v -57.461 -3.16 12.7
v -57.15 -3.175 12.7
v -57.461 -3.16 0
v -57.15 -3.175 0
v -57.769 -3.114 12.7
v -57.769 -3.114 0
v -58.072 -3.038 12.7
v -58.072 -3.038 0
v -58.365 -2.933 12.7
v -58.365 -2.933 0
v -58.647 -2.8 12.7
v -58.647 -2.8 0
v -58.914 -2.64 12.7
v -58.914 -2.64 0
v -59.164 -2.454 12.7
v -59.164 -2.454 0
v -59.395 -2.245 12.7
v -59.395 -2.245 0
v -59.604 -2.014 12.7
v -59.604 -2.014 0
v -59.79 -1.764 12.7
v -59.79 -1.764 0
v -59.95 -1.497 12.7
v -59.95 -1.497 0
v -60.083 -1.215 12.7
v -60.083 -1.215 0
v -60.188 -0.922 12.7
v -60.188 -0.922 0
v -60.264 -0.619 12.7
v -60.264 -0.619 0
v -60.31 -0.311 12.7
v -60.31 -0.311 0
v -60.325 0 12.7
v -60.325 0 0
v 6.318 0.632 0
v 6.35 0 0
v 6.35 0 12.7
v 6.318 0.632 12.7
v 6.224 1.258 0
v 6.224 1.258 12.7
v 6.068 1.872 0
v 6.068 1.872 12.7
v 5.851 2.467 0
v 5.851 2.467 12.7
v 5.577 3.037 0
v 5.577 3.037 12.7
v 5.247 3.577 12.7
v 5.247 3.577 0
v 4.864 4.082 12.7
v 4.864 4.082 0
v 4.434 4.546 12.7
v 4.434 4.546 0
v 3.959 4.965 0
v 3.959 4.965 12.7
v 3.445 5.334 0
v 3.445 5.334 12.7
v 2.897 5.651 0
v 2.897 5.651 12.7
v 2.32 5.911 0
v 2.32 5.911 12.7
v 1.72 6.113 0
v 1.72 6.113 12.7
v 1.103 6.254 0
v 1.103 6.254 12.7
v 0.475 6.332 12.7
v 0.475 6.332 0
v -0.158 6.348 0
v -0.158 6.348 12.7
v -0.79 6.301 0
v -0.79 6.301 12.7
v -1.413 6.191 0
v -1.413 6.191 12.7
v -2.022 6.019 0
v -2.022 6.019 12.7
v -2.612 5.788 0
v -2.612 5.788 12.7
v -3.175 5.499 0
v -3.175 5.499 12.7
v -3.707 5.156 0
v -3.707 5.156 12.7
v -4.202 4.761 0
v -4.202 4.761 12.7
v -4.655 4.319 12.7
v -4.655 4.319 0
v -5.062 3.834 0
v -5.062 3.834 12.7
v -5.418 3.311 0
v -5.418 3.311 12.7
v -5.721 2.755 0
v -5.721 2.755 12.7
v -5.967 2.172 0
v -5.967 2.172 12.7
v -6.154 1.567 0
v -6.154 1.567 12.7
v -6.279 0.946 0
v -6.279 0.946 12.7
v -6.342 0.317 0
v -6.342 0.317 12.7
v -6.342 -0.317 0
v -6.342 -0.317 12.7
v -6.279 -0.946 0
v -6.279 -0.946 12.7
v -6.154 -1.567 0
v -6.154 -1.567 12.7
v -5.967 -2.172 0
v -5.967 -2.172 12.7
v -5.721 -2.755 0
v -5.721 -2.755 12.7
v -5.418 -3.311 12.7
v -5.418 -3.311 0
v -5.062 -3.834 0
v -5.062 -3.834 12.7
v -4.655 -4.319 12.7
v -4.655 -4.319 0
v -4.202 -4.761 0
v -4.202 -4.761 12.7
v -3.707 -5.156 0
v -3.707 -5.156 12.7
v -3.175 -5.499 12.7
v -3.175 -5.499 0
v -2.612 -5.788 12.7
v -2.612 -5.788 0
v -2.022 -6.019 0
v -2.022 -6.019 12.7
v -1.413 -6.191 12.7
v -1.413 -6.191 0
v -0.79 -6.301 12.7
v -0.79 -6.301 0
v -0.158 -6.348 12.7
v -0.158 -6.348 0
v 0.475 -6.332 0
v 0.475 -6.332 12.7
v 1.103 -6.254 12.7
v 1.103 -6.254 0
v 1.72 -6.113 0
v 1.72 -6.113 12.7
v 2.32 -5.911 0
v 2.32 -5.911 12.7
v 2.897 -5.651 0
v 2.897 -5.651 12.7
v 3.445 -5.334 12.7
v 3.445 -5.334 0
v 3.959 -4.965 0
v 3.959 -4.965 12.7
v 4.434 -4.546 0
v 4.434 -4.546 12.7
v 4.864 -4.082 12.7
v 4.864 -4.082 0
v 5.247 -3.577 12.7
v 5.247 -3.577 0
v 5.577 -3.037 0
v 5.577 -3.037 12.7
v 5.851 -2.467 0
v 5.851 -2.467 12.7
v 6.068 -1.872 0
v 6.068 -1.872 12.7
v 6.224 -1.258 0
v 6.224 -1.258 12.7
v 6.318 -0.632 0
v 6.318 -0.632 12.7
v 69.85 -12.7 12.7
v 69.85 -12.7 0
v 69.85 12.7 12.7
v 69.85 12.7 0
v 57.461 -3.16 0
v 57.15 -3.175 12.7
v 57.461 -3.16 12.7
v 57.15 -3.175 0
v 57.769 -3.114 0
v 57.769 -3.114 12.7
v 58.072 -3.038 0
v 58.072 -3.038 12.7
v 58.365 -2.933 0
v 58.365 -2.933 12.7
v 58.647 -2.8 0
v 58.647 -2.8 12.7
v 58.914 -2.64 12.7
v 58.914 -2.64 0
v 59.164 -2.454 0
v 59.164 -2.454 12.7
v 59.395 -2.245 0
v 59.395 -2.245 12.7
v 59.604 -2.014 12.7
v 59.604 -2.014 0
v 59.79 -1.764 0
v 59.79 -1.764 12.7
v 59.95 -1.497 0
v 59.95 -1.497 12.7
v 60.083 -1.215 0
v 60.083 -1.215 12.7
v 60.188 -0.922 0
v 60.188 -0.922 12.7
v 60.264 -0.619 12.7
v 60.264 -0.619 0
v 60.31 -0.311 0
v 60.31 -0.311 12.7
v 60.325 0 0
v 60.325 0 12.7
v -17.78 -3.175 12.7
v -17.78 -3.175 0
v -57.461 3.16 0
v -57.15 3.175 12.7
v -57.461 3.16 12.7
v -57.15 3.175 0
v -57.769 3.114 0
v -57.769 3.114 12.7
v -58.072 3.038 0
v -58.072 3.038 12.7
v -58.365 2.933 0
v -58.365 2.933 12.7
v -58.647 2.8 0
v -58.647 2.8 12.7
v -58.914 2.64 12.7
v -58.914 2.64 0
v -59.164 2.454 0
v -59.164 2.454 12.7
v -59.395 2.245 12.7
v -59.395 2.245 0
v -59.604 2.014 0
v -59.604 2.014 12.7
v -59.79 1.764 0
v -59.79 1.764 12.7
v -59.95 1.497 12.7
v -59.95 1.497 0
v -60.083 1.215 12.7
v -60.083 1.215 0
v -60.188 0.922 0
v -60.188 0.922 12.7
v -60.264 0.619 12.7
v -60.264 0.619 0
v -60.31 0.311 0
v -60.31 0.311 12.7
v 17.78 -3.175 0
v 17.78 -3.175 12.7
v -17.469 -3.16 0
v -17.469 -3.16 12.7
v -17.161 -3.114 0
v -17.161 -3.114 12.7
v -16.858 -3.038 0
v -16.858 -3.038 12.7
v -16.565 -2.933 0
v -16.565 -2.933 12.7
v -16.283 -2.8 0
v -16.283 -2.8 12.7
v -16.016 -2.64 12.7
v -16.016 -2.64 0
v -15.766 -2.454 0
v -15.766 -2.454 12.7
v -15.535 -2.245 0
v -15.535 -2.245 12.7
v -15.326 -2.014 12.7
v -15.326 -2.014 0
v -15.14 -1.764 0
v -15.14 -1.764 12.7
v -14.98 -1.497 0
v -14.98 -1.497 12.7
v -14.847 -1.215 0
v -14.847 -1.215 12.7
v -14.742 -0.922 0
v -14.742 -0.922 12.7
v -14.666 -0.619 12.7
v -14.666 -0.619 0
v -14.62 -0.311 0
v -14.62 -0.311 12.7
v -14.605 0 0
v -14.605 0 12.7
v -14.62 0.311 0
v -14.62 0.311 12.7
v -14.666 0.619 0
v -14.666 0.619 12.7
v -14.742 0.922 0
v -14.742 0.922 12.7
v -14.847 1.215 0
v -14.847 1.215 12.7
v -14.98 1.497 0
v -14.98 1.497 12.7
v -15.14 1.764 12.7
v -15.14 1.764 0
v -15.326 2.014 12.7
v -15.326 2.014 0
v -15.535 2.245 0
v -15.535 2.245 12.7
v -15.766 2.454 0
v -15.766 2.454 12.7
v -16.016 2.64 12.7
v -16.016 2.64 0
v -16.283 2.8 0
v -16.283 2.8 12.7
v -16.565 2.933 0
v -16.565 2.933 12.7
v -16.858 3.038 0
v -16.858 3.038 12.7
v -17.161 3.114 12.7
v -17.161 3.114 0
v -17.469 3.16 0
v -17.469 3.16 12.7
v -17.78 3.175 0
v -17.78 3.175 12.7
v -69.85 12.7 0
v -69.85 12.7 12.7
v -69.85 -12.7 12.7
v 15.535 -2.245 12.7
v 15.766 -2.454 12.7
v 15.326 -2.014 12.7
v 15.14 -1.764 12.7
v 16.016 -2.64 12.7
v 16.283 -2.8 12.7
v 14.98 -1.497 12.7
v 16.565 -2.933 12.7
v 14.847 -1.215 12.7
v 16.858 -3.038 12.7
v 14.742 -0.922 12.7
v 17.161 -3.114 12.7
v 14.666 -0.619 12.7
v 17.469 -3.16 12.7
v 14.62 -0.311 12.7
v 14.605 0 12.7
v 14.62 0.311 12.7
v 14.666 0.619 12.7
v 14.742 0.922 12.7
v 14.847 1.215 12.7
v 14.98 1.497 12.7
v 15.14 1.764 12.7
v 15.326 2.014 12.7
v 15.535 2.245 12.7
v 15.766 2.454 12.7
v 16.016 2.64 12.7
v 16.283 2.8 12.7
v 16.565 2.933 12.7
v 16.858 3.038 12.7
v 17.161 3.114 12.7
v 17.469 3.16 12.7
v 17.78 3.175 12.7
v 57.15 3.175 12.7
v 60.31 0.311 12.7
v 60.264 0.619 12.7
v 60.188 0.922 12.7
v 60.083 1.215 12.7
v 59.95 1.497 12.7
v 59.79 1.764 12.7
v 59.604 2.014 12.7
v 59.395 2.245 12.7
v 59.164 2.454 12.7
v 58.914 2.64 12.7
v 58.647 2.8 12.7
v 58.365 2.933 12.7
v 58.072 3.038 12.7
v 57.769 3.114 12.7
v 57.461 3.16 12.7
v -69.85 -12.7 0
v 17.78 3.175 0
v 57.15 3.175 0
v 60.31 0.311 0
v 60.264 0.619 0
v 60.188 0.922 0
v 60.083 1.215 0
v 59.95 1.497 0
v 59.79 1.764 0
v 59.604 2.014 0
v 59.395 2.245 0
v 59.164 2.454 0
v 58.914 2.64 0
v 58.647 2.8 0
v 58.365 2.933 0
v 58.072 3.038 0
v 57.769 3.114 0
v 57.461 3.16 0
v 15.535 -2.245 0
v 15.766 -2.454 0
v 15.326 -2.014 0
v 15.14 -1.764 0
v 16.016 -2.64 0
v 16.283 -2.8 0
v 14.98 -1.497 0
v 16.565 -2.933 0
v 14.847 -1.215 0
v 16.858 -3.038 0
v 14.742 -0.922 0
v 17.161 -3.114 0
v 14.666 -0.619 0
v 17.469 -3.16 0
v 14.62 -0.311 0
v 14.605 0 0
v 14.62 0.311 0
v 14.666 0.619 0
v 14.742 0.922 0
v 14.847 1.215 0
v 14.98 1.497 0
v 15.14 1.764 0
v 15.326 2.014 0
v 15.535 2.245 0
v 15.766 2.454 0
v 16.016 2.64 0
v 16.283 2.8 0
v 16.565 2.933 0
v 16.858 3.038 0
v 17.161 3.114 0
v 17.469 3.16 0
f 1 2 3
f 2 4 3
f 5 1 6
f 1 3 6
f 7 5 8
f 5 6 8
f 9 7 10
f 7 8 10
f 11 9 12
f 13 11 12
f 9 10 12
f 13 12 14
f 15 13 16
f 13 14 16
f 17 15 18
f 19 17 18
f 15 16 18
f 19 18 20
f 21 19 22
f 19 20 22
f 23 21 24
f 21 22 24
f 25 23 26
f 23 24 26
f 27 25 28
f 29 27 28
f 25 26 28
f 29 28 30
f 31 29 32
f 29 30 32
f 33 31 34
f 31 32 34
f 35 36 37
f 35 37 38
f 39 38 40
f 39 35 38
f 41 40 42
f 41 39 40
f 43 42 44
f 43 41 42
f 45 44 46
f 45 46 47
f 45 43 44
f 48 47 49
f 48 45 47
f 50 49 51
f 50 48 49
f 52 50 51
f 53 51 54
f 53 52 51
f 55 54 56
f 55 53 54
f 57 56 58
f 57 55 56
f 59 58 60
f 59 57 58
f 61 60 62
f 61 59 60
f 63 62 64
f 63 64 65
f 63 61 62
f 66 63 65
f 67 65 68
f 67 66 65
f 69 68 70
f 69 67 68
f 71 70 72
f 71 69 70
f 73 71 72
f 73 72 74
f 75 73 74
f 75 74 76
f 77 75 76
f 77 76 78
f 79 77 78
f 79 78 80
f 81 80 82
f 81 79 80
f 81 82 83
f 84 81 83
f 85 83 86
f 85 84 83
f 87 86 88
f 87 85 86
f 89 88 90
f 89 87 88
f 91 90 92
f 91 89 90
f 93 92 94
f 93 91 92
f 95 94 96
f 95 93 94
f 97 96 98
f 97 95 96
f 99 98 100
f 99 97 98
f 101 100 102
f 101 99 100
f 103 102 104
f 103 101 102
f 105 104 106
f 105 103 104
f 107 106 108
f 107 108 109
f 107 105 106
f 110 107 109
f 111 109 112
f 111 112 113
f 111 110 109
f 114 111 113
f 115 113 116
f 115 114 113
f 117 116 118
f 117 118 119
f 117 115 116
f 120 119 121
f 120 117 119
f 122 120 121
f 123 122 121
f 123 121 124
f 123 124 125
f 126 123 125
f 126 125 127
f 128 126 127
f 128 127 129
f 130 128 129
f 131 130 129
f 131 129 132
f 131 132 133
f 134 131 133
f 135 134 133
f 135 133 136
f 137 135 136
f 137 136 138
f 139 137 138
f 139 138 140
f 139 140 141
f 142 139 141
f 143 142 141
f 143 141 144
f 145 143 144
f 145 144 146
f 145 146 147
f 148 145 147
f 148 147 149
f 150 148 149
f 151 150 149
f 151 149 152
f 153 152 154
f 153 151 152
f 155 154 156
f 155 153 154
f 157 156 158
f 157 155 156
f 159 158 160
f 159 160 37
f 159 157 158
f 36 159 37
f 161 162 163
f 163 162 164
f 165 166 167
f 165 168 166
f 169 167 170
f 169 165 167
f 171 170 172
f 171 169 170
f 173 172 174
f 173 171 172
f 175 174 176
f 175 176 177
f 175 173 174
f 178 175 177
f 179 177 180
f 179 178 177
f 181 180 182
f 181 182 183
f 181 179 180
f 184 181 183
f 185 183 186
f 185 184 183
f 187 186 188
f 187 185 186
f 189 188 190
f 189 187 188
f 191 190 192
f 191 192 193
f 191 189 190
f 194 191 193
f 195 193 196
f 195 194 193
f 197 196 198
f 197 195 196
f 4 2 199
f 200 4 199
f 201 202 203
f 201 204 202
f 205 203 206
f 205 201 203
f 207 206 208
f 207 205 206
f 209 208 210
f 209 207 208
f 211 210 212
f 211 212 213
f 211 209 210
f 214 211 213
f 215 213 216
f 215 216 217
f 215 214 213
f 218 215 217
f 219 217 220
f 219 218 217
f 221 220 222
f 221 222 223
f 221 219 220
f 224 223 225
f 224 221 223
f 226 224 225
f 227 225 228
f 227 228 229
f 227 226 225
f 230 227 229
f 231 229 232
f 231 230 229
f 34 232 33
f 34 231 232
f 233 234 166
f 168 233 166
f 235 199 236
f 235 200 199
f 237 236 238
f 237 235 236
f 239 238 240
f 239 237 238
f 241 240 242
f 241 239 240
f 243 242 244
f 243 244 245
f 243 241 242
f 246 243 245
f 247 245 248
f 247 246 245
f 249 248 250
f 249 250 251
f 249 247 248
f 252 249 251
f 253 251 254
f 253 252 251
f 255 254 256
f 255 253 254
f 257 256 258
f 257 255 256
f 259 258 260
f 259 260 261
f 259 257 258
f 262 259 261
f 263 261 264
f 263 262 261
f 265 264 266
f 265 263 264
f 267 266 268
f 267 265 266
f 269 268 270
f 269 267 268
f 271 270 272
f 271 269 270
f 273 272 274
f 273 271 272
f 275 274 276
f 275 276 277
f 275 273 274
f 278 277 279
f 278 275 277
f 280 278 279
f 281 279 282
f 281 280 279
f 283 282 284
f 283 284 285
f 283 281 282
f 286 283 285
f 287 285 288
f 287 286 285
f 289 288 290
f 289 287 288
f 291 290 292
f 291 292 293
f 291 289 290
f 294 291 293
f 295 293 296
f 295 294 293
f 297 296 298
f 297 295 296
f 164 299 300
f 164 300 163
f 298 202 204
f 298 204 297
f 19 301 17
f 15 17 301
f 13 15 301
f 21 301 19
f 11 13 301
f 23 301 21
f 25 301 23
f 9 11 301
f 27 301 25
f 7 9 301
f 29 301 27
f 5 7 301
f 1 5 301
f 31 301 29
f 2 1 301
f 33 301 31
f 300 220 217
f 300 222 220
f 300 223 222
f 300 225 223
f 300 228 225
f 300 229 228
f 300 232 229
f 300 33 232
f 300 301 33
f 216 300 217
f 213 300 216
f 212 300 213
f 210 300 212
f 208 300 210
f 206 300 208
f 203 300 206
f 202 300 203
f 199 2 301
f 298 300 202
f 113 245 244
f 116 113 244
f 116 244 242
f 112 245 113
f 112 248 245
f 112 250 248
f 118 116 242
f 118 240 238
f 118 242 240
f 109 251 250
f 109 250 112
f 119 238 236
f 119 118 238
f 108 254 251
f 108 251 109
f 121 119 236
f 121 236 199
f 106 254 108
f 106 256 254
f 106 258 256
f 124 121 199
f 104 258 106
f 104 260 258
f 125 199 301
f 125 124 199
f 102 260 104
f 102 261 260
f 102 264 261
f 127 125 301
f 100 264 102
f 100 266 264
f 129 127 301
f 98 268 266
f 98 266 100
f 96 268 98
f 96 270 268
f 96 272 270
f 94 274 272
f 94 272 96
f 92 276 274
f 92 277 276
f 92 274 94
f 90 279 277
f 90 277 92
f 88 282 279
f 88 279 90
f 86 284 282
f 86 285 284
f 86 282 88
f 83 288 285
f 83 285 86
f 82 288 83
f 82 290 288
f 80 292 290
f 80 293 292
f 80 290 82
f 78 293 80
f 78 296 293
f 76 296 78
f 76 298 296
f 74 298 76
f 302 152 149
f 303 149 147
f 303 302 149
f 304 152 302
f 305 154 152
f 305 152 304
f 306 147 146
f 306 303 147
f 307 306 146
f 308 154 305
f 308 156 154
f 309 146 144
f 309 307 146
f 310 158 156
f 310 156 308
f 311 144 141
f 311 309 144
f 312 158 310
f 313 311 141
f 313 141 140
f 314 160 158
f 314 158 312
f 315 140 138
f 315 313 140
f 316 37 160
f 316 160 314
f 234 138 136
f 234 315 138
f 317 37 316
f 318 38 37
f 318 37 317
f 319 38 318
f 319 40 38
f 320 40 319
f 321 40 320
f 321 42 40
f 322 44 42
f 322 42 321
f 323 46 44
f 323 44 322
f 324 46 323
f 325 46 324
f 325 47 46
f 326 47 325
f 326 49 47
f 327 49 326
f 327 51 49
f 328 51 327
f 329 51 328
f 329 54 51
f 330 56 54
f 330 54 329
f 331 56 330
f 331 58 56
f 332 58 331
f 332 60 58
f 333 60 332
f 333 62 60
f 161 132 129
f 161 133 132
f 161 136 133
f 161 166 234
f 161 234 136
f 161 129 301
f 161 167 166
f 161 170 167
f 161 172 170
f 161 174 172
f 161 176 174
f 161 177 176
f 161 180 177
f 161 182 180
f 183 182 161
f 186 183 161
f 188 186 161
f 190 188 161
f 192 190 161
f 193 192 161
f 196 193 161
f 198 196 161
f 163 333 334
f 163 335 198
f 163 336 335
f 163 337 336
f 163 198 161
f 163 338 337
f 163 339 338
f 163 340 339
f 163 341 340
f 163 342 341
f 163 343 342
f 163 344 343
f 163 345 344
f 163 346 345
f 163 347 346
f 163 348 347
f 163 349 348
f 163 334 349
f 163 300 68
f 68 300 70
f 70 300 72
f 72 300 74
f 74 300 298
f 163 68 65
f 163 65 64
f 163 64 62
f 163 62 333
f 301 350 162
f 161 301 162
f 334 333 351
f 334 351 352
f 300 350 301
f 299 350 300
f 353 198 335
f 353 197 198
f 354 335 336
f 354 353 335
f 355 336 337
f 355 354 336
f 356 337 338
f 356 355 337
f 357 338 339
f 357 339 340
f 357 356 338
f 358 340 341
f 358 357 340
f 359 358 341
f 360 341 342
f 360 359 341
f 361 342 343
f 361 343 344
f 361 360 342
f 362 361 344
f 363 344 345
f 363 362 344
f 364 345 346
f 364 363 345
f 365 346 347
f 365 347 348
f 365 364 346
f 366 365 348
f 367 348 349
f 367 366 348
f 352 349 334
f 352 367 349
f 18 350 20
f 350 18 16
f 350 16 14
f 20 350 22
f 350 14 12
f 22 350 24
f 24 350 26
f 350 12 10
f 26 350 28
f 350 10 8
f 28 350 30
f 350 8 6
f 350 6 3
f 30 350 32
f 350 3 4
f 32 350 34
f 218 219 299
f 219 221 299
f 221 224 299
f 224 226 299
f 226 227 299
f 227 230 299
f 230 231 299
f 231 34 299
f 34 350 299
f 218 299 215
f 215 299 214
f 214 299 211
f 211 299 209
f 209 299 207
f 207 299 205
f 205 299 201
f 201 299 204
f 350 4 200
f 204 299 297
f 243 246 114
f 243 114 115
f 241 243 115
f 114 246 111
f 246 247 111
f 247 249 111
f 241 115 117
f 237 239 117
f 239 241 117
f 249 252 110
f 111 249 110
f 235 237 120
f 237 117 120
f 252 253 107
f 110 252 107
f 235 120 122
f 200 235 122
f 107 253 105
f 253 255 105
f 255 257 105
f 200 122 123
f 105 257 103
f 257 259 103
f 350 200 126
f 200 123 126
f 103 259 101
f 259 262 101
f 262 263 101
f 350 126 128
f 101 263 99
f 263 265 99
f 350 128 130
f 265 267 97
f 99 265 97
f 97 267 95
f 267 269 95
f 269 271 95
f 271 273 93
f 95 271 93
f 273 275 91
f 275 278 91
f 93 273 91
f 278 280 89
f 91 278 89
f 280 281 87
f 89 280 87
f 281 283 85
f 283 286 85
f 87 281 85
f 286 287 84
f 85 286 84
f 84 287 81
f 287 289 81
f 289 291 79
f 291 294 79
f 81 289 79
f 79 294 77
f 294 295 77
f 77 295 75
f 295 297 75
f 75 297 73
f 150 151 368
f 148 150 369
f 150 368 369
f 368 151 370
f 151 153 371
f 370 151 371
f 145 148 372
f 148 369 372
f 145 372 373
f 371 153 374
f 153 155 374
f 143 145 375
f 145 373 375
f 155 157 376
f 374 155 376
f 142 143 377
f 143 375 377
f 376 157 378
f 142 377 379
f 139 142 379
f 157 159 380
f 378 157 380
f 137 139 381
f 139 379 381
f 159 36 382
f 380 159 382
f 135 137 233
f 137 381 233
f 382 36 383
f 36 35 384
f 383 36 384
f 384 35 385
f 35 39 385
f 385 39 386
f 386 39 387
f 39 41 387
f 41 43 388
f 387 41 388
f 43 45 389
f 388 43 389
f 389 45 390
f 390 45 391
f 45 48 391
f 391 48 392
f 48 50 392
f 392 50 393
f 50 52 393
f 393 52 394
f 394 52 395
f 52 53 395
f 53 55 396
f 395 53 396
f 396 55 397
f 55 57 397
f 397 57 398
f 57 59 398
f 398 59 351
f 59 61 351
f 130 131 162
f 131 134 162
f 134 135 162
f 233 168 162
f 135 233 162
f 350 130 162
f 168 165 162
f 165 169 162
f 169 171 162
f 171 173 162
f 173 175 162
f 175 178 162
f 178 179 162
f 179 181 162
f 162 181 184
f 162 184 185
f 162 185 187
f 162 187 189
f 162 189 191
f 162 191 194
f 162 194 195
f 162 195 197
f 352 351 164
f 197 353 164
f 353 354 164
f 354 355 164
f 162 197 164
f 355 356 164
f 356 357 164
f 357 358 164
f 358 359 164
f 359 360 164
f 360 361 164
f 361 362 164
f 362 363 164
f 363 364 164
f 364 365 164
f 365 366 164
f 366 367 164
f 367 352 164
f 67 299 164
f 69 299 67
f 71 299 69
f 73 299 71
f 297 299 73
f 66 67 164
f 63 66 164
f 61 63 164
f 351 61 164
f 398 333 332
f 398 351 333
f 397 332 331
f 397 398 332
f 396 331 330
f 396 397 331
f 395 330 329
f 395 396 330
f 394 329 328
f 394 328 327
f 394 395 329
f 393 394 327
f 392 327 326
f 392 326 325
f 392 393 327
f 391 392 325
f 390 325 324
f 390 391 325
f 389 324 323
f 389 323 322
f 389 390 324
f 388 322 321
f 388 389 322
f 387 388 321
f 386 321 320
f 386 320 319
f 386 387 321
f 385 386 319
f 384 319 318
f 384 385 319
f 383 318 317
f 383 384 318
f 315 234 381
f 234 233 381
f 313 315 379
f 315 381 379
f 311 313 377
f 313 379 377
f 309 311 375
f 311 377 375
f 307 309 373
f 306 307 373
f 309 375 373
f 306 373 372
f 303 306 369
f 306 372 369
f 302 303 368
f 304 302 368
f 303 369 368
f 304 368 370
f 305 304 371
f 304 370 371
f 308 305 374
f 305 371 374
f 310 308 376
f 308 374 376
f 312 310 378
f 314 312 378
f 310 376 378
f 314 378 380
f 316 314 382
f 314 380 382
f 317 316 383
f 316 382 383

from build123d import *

# Parameters (mm, degrees)
SKETCH1_W           = 139.7
SKETCH1_H           = 25.4
SKETCH1_R           = 6.35
BOSS_EXTRUDE1_DEPTH = 12.7
SKETCH4_W           = 45.72
SKETCH4_H           = 6.35
CUT_EXTRUDE1_DEPTH  = 13.335
FILLET1_R           = 3.175


with BuildPart() as part:
    # Sketch1 → Boss-Extrude1 (new body)
    with BuildSketch(Plane.XY):
        Rectangle(SKETCH1_W, SKETCH1_H)
        Circle(SKETCH1_R, mode=Mode.SUBTRACT)
    extrude(amount=BOSS_EXTRUDE1_DEPTH)

    # Sketch4 → Cut-Extrude1 (cut)
    with BuildSketch(Plane.XY.offset(12.7)):
        with Locations((-37.465, 0)):
            Rectangle(SKETCH4_W, SKETCH4_H)
        with Locations((37.465, 0)):
            Rectangle(SKETCH4_W, SKETCH4_H)
    extrude(amount=-CUT_EXTRUDE1_DEPTH, mode=Mode.SUBTRACT)

    # Fillet1
    fillet1_edges = [part.edges().sort_by_distance(p)[0] for p in [
        (-14.605, 3.175, 6.35),
        (-14.605, -3.175, 6.35),
        (-60.325, -3.175, 6.35),
        (-60.325, 3.175, 6.35),
        (14.605, 3.175, 6.35),
        (14.605, -3.175, 6.35),
        (60.325, -3.175, 6.35),
        (60.325, 3.175, 6.35),
    ]]
    fillet(fillet1_edges, radius=FILLET1_R - 0.0001)  # a hair under: the kernel refuses the full size


solid = part.part
